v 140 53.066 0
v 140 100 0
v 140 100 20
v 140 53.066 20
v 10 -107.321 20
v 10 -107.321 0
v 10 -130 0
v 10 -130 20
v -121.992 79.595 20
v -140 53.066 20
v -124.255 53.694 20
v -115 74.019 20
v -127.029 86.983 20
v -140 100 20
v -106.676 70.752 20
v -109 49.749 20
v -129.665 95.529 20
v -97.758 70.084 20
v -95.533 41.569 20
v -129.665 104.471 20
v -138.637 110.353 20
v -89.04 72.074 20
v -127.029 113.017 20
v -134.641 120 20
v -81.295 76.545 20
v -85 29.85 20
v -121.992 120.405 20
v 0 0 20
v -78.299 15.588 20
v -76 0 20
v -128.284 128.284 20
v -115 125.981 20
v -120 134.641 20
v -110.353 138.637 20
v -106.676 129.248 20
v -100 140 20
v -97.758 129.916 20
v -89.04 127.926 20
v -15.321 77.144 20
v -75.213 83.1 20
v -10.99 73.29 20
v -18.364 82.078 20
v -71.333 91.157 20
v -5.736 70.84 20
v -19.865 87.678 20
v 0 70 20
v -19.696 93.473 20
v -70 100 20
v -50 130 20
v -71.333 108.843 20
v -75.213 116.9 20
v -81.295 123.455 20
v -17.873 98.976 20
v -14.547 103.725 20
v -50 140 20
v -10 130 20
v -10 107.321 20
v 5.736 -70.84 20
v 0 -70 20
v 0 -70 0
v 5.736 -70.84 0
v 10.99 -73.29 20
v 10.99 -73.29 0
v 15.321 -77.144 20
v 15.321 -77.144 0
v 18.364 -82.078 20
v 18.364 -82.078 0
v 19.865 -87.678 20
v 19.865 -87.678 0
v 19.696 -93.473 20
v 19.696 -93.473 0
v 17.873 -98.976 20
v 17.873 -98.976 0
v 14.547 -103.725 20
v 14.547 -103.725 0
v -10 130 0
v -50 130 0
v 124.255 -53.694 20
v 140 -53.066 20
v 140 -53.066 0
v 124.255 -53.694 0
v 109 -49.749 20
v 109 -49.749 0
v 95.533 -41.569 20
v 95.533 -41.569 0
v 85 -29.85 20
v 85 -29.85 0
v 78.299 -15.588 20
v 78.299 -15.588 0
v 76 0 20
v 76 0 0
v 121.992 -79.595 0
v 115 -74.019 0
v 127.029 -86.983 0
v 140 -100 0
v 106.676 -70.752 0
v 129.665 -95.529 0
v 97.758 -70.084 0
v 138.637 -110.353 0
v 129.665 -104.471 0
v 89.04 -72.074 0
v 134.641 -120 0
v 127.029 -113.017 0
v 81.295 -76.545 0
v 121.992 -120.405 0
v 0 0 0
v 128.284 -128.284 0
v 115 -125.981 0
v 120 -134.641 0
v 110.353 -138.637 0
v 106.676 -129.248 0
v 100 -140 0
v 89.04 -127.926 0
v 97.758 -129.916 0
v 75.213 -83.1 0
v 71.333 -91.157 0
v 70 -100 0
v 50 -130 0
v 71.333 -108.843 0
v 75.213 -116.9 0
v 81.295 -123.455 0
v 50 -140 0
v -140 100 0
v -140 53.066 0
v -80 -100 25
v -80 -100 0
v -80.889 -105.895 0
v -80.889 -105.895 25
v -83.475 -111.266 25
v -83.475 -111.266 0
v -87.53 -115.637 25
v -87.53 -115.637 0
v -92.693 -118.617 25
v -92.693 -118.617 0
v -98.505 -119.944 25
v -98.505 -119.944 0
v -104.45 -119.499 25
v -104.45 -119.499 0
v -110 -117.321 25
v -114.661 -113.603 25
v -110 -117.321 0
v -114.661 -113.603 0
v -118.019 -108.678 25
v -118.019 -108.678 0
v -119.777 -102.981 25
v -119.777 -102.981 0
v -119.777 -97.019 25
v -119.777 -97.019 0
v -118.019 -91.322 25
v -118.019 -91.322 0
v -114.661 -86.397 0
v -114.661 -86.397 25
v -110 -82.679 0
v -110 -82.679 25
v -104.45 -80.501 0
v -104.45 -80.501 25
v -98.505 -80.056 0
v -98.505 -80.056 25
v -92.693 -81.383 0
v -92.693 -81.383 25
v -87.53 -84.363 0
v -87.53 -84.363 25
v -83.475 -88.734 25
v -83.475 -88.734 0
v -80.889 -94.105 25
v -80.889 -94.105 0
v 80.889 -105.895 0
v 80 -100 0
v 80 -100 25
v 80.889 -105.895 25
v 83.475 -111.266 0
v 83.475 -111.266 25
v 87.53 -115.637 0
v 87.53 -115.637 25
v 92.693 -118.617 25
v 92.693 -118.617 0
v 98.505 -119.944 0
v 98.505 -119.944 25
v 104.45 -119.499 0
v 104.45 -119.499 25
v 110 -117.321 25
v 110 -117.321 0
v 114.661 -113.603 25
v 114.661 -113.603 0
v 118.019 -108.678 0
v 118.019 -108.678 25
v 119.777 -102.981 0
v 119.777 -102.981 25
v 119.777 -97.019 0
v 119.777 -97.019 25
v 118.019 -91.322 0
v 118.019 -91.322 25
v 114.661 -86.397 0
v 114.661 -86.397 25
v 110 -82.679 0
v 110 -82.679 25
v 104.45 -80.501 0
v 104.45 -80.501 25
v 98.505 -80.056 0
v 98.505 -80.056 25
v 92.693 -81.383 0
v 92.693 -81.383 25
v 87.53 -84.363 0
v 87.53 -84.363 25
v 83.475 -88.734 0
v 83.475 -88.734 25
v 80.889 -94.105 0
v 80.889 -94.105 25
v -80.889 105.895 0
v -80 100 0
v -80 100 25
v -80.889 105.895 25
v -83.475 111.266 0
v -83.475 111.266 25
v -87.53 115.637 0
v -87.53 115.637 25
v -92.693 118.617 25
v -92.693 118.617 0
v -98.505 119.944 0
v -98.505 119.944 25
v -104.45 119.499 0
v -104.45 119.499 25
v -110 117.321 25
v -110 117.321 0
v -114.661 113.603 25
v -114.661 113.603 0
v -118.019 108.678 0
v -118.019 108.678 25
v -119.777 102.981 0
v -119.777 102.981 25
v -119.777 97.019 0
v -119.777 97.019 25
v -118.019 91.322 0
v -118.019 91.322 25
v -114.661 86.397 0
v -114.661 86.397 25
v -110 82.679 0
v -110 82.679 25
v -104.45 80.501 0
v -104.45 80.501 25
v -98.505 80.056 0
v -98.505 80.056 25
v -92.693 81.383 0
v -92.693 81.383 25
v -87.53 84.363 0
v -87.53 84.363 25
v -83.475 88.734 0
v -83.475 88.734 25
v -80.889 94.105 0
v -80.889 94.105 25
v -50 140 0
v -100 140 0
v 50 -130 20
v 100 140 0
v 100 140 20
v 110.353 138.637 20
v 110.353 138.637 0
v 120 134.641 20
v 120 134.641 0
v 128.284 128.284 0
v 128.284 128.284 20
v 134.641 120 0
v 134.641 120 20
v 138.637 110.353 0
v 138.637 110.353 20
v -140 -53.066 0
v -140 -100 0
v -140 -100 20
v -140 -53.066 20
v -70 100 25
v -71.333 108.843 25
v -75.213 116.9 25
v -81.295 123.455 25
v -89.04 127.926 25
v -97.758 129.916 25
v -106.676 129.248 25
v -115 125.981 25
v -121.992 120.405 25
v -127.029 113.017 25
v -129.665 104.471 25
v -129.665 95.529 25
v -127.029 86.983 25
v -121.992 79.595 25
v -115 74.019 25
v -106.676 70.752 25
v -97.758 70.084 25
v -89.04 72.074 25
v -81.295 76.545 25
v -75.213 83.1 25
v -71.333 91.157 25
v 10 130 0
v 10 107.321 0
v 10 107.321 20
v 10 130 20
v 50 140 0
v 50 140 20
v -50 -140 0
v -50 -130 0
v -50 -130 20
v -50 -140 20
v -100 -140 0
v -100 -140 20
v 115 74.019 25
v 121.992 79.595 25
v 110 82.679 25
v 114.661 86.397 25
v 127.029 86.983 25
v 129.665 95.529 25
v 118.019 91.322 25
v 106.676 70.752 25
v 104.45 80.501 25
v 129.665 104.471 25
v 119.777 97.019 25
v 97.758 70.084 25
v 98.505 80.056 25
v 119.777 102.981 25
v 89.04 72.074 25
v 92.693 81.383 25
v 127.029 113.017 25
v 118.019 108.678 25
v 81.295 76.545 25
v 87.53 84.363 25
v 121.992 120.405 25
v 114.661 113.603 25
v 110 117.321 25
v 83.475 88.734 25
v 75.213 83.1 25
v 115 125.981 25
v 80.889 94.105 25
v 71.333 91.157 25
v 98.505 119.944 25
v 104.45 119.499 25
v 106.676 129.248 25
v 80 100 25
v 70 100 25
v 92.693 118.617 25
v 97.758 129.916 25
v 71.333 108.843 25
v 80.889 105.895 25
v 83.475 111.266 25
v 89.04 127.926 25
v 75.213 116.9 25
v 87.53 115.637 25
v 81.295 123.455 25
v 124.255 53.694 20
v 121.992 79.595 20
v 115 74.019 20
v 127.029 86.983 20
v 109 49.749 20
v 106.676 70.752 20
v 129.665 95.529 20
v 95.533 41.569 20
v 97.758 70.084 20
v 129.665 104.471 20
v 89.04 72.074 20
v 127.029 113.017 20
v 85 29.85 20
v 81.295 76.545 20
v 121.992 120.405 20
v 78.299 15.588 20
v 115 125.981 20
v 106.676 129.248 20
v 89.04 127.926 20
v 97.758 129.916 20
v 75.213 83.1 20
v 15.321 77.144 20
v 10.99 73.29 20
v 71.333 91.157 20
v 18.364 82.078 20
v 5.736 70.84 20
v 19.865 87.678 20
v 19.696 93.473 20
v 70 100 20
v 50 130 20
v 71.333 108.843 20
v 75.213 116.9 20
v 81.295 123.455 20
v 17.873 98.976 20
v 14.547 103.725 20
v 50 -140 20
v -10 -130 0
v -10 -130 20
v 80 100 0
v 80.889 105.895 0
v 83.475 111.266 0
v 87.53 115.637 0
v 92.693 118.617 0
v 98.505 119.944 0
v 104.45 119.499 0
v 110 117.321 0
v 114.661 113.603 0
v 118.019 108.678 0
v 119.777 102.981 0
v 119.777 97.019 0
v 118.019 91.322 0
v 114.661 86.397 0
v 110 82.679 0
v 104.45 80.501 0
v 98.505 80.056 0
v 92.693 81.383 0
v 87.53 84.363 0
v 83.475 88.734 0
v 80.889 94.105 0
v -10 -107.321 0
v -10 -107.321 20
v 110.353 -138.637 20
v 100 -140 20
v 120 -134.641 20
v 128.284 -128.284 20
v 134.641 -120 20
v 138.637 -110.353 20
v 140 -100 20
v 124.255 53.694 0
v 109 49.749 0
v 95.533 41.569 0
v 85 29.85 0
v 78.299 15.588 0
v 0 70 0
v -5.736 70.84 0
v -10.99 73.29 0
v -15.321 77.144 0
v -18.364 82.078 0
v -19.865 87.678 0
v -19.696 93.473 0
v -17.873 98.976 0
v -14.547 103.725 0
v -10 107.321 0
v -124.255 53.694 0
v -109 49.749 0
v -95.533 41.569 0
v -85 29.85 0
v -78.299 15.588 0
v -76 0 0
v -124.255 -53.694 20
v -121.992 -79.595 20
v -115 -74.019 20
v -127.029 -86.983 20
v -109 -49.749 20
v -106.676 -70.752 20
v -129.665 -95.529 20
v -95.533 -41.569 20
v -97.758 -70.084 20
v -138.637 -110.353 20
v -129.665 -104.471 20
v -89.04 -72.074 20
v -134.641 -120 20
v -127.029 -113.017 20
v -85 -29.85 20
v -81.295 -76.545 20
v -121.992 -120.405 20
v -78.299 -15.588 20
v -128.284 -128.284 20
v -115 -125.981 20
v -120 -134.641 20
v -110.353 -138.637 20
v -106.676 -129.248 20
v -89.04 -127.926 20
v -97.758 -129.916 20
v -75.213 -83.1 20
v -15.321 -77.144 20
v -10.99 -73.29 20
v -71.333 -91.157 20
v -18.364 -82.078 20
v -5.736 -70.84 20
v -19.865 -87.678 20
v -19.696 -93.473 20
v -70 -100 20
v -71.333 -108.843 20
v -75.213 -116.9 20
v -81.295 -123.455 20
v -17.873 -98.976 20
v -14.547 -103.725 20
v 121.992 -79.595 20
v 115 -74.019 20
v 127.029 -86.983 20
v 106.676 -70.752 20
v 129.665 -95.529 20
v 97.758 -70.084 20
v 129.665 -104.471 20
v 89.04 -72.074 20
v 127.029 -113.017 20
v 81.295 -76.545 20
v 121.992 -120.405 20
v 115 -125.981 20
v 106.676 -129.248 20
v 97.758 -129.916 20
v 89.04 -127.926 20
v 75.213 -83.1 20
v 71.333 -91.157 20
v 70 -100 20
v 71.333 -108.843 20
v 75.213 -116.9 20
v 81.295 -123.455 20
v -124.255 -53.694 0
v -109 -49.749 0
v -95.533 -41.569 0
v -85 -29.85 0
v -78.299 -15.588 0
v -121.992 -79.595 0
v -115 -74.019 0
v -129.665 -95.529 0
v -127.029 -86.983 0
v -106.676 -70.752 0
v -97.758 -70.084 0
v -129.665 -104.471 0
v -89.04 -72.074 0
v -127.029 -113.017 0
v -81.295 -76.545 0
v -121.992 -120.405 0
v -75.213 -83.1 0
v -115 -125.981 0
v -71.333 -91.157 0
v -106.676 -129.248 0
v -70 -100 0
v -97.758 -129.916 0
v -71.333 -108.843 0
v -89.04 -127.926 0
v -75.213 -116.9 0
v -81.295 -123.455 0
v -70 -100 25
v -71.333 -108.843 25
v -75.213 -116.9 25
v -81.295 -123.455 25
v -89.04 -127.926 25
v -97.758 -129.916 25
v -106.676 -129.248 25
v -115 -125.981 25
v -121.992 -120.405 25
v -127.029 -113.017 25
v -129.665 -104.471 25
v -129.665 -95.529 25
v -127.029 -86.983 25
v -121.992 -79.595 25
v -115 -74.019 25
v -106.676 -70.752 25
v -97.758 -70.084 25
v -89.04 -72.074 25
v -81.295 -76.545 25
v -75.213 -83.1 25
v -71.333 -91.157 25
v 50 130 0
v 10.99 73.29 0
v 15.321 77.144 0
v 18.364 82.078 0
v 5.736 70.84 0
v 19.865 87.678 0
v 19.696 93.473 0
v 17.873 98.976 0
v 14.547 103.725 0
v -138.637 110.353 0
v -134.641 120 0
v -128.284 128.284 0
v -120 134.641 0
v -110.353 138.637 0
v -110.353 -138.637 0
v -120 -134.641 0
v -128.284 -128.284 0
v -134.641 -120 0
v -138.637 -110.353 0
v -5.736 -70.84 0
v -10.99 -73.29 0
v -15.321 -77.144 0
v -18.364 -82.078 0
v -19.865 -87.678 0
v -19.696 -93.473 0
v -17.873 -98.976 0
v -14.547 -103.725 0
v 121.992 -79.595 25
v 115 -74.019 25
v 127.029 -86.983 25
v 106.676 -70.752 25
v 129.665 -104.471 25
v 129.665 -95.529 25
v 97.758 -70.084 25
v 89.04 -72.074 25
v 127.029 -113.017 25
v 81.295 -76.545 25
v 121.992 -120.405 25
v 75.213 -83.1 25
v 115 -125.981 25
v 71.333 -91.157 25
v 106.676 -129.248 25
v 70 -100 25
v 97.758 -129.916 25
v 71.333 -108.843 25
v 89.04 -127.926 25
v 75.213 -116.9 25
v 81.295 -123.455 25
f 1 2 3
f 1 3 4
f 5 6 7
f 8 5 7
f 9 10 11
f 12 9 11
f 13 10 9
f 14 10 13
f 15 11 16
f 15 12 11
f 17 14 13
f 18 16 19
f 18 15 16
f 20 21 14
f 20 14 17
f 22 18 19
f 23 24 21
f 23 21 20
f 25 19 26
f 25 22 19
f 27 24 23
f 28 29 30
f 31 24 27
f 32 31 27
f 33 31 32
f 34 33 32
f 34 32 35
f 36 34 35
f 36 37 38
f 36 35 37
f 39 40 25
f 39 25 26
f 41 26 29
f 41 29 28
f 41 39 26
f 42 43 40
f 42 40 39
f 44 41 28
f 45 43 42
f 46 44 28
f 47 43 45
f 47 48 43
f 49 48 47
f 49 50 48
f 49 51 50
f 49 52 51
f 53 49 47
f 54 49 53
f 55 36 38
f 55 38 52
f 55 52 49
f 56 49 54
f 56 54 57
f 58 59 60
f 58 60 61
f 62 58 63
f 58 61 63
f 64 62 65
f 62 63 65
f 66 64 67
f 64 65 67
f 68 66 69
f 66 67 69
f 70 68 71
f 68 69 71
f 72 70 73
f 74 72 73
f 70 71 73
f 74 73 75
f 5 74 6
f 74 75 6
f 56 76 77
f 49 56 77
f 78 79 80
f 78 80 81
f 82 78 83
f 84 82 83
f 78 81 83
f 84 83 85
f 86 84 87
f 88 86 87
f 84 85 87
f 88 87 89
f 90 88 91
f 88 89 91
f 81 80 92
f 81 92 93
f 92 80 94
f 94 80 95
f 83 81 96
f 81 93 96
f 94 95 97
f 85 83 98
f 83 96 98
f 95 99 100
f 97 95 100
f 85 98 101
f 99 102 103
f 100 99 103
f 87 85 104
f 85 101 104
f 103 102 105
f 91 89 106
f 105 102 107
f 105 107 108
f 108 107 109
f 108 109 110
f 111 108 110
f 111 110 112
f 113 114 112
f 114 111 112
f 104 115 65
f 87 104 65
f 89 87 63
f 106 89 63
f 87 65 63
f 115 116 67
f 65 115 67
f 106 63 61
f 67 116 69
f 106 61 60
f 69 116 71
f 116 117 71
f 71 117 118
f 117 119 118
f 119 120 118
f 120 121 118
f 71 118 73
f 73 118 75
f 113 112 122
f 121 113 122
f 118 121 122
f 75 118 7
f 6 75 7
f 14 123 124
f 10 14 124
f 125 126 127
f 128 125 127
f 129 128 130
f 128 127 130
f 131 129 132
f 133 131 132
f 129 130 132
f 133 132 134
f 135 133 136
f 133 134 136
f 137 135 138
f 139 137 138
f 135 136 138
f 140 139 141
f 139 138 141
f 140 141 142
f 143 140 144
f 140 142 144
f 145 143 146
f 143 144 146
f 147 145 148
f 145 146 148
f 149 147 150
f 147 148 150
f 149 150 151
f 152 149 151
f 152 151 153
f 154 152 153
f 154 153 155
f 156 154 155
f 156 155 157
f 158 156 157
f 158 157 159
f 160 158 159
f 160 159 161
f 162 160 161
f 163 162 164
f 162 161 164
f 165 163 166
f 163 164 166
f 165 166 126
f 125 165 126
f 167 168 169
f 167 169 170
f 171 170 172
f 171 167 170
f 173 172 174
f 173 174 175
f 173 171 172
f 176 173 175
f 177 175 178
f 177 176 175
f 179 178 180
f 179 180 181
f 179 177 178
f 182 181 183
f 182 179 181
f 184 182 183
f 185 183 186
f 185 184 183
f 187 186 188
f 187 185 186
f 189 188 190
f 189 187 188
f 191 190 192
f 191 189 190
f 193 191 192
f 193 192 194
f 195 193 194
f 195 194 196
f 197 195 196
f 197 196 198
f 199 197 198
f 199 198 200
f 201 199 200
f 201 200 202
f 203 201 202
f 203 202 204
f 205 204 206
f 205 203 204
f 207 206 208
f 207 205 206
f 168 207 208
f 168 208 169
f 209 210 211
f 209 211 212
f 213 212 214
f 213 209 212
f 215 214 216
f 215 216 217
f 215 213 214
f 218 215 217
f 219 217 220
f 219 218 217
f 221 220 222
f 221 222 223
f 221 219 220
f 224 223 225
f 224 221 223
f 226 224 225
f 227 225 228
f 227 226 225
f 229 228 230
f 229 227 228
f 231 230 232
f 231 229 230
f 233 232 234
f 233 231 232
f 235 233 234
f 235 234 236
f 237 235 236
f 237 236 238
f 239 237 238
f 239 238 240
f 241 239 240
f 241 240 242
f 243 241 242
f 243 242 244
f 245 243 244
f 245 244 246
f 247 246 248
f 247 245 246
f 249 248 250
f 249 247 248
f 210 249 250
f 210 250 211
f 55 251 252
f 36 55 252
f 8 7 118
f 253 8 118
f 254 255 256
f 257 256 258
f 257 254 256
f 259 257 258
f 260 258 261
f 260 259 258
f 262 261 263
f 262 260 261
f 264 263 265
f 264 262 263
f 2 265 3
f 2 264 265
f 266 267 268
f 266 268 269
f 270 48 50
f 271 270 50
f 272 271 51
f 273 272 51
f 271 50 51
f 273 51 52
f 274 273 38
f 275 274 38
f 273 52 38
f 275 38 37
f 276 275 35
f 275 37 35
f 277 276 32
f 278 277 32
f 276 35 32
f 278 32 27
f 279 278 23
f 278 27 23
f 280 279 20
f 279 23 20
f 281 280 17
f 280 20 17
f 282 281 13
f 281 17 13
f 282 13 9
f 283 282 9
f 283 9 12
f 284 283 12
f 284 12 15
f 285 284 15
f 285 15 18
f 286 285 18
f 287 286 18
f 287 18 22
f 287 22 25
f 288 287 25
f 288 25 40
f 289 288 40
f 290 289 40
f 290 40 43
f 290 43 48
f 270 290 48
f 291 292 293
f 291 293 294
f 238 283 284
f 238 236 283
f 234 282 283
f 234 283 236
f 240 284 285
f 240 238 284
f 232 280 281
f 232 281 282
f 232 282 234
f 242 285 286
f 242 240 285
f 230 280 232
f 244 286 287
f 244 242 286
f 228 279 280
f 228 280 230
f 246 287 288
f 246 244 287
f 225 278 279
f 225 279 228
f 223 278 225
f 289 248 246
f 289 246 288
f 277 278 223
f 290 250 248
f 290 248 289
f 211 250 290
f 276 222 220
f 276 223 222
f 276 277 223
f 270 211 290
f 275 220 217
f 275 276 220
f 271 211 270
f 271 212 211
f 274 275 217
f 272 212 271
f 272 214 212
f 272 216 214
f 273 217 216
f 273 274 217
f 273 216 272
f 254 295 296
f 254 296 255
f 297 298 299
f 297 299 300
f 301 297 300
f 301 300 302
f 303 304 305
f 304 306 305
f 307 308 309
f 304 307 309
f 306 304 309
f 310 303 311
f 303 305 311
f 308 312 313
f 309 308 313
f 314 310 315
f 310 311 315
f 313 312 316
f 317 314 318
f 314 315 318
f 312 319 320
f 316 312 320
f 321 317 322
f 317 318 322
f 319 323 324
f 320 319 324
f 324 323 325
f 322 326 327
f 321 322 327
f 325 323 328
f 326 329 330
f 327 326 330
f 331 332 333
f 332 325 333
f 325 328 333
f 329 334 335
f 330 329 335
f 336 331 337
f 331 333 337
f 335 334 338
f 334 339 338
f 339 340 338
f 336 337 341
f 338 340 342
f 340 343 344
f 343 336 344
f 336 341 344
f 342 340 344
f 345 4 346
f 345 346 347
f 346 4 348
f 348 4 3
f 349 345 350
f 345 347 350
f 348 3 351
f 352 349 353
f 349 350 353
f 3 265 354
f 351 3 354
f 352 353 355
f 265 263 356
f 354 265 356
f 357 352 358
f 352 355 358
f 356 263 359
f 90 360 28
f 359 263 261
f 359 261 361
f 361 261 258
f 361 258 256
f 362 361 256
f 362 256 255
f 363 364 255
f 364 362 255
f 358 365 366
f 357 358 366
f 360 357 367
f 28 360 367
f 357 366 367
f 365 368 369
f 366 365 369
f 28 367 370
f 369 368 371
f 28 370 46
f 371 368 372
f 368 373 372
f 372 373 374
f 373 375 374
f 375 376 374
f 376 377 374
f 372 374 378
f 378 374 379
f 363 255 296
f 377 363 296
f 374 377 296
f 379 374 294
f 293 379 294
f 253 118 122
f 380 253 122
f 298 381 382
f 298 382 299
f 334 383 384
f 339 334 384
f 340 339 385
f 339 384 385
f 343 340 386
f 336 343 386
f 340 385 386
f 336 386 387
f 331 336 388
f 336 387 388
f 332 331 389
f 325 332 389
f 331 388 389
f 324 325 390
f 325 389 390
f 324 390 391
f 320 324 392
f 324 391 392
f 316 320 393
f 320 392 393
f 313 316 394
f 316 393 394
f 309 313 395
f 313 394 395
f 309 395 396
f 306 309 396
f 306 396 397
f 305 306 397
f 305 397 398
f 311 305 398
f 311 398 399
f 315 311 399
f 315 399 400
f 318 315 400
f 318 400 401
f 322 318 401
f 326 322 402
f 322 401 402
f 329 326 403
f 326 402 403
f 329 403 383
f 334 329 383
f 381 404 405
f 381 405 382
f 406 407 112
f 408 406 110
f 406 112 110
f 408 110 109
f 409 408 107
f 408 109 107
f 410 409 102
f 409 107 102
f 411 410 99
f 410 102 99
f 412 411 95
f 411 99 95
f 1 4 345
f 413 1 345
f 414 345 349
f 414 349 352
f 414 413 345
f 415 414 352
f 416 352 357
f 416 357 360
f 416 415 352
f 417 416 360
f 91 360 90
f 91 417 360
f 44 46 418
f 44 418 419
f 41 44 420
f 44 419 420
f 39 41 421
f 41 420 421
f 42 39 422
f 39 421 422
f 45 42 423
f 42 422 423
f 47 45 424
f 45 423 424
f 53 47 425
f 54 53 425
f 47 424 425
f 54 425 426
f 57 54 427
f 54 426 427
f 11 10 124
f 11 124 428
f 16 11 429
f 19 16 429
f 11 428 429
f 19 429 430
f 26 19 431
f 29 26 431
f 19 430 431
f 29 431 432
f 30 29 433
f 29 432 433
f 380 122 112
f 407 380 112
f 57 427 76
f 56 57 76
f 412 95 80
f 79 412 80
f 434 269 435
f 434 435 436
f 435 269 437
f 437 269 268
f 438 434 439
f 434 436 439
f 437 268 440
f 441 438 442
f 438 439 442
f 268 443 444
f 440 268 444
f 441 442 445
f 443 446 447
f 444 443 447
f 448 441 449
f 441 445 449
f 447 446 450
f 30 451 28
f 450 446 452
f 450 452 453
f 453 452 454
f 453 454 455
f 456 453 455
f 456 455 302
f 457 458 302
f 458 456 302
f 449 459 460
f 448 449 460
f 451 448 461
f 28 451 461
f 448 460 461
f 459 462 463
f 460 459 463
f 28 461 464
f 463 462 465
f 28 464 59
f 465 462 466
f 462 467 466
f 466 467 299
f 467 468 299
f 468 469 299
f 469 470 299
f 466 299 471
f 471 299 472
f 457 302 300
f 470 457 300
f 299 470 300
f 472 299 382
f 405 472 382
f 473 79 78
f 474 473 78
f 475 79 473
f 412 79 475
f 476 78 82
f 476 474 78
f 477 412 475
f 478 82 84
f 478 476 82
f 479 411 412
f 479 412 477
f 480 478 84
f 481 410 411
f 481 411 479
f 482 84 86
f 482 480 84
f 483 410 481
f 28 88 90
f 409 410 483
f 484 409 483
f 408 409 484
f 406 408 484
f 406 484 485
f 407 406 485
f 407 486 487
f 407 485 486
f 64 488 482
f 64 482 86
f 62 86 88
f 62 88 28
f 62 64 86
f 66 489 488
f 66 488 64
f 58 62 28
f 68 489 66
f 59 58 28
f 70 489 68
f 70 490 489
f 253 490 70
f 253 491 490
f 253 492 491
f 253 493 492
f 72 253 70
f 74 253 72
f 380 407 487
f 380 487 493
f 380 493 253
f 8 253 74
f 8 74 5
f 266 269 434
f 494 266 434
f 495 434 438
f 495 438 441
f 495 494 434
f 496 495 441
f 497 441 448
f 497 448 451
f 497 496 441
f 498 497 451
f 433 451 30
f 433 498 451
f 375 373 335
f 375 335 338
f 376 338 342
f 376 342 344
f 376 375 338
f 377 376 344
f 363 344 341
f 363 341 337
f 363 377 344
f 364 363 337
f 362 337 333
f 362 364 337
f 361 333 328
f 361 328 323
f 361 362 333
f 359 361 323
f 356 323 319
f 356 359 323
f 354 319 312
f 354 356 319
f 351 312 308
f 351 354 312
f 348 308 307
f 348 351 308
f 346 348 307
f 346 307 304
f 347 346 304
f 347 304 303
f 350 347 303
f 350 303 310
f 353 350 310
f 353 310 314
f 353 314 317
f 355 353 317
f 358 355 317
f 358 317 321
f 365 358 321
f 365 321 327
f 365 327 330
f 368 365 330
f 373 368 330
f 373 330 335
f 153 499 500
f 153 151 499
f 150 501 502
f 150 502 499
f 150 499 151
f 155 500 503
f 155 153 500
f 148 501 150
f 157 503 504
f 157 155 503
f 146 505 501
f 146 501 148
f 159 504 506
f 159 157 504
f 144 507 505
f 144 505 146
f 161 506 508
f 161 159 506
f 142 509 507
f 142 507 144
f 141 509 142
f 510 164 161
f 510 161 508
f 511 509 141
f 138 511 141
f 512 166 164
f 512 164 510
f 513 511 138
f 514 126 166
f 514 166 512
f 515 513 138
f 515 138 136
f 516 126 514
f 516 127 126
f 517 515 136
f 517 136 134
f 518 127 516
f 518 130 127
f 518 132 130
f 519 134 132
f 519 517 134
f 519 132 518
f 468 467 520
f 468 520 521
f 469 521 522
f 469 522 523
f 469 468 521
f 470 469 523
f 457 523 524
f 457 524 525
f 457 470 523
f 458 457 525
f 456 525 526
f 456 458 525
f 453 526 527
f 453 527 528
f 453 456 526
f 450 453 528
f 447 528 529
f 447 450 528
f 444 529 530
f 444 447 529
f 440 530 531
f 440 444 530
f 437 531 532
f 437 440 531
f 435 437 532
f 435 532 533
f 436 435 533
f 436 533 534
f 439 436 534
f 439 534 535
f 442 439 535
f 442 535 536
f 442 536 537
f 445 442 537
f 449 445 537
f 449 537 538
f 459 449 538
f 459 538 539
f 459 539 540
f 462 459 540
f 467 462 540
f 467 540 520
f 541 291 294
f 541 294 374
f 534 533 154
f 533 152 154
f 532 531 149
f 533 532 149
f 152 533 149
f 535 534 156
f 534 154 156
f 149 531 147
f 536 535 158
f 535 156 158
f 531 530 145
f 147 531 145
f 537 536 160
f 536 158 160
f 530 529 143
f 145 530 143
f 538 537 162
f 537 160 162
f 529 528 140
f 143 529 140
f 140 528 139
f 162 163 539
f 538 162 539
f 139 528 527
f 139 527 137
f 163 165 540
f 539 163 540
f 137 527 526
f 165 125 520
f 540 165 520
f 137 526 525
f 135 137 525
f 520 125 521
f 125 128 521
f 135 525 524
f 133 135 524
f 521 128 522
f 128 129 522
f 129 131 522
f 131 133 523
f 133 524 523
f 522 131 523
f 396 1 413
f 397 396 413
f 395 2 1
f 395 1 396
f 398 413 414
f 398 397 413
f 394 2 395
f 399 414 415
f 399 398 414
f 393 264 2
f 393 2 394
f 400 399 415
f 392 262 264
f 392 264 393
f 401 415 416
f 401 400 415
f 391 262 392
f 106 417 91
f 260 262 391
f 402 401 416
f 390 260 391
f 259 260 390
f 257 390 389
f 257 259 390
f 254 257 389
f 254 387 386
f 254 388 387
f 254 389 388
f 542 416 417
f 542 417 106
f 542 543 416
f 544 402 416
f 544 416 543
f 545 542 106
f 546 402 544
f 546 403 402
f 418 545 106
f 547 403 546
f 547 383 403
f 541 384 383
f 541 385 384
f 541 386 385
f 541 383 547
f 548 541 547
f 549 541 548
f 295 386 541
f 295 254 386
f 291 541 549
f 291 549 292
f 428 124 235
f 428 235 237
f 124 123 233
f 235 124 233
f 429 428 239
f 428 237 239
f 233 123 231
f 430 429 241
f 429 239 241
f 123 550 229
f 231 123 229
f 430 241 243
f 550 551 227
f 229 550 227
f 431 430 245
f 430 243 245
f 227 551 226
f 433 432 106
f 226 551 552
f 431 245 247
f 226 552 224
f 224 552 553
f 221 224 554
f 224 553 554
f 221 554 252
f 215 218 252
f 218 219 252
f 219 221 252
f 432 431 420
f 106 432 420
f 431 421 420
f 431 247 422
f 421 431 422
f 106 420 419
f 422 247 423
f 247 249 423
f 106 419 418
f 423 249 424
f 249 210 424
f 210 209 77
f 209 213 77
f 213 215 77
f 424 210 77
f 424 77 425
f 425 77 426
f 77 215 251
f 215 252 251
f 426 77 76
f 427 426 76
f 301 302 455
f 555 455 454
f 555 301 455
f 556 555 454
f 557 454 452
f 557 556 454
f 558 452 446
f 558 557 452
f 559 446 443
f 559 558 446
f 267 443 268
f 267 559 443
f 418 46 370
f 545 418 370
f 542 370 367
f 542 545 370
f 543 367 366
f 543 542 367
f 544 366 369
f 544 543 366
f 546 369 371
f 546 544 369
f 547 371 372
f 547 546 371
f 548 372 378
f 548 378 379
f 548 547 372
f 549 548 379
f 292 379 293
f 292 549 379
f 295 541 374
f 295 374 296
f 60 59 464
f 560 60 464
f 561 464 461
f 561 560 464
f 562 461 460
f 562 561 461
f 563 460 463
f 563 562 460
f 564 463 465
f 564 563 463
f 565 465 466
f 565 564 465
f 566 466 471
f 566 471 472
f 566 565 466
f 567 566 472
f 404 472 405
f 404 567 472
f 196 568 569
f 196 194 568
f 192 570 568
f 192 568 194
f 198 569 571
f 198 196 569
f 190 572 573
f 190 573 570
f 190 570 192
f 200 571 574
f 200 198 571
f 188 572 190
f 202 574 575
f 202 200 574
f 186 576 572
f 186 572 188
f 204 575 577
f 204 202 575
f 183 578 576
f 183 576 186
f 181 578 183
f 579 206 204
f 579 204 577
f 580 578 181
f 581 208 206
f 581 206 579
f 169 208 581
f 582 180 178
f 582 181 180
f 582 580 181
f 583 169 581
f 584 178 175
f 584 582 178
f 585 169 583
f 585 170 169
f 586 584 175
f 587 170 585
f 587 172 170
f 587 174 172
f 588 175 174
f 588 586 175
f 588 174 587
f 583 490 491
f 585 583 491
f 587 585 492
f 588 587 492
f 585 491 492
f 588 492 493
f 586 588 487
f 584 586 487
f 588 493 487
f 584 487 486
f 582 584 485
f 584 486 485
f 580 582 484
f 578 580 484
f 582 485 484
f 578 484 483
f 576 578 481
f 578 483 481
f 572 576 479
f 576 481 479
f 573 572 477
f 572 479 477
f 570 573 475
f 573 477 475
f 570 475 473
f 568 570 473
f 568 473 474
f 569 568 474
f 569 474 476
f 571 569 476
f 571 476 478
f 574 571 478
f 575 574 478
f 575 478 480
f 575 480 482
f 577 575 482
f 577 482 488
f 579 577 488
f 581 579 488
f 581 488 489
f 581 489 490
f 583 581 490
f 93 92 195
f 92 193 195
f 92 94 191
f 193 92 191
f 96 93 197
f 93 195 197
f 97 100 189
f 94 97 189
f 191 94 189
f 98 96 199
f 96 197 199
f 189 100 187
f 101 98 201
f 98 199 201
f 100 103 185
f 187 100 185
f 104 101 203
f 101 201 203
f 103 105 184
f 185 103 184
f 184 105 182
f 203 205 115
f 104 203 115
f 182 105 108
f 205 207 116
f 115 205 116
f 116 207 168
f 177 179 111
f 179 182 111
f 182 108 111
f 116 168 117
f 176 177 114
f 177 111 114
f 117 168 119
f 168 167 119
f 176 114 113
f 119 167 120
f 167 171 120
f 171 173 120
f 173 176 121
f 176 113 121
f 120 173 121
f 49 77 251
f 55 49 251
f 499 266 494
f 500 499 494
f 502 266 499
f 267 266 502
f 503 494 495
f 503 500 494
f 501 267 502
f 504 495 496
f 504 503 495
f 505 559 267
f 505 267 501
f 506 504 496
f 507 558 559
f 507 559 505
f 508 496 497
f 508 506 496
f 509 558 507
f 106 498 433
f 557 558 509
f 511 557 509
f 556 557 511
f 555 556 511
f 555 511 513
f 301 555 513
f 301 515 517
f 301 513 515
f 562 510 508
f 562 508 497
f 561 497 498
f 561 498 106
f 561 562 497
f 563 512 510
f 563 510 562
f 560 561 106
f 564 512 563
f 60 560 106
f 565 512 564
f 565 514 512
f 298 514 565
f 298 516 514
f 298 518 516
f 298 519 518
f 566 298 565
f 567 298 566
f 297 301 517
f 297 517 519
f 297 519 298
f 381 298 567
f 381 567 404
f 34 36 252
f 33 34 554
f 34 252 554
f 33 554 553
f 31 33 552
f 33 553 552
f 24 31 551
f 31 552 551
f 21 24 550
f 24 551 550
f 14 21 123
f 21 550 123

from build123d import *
from build123d.topology import SkipClean

# Parameters (mm, degrees)
SKETCH1_R                                    = 30
BOSS_EXTRUDE3_DEPTH                          = 20
SKETCH1_3_R                                  = 30
SKETCH1_3_R_2                                = 20
BOSS_EXTRUDE4_DEPTH                          = 25
MIRROR1_AT_THE_SECOND_PLANE_COPY_1_SKETC_R   = 30
MIRROR1_AT_THE_SECOND_PLANE_COPY_1_DEPTH     = 20
MIRROR1_AT_THE_SECOND_PLANE_COPY_2_SKETC_R   = 30
MIRROR1_AT_THE_SECOND_PLANE_COPY_2_SKETC_R_2 = 20
MIRROR1_AT_THE_SECOND_PLANE_COPY_2_DEPTH     = 25


with BuildPart() as part:
    # Sketch1 → Boss-Extrude3 (new body)
    with BuildSketch(Plane.XY):
        with BuildLine():
            Line((-140, 100), (-140, 53.065996646))
            ThreePointArc((-140, 53.065996646), (-95.532624121, 41.569219382), (-76, 0))
            Line((-76, 0), (0, 0))
            Line((0, 0), (0, 70))
            ThreePointArc((0, 70), (-19.318516526, 84.823619098), (-10, 107.320508076))
            Line((-10, 107.320508076), (-10, 130))
            Line((-10, 130), (-50, 130))
            Line((-50, 130), (-50, 140))
            Line((-50, 140), (-100, 140))
            ThreePointArc((-100, 140), (-128.284271247, 128.284271247), (-140, 100))
        make_face()
        with Locations((-100, 100)):
            Circle(SKETCH1_R, mode=Mode.SUBTRACT)
    boss_extrude3 = extrude(amount=BOSS_EXTRUDE3_DEPTH)

    # Sketch1<3> → Boss-Extrude4 (add)
    with BuildSketch(Plane.XY):
        with Locations((-100, 100)):
            Circle(SKETCH1_3_R)
        with Locations((-100, 100)):
            Circle(SKETCH1_3_R_2, mode=Mode.SUBTRACT)
    boss_extrude4 = extrude(amount=BOSS_EXTRUDE4_DEPTH)

    # Mirror1: Boss-Extrude3, Boss-Extrude4 across plane
    add(boss_extrude3.mirror(Plane(origin=(0, 0, 0), x_dir=(0, 0, 1), z_dir=(1, 0, 0))))
    add(boss_extrude4.mirror(Plane(origin=(0, 0, 0), x_dir=(0, 0, 1), z_dir=(1, 0, 0))))

    # Mirror1 at the second plane: Boss-Extrude3, Boss-Extrude4 across plane
    with SkipClean():  # the faces are left unmerged after this step: merging them gives an invalid solid
        add(boss_extrude3.mirror(Plane.ZX))
        add(boss_extrude4.mirror(Plane.ZX))

    # Mirror1 at the second plane copy 1 sketc → Mirror1 at the second plane copy 1 (add)
    with SkipClean():  # the faces are left unmerged after this step: merging them gives an invalid solid
        with BuildSketch(Plane(origin=(0, 0, 0), x_dir=(-1, 0, 0), z_dir=(0, 0, 1))):
            with BuildLine():
                Line((-140, 100), (-140, 53.065996646))
                ThreePointArc((-140, 53.065996646), (-95.532624121, 41.569219382), (-76, 0))
                Line((-76, 0), (0, 0))
                Line((0, 0), (0, 70))
                ThreePointArc((0, 70), (-19.318516526, 84.823619098), (-10, 107.320508076))
                Line((-10, 107.320508076), (-10, 130))
                Line((-10, 130), (-50, 130))
                Line((-50, 130), (-50, 140))
                Line((-50, 140), (-100, 140))
                ThreePointArc((-100, 140), (-128.284271247, 128.284271247), (-140, 100))
            make_face()
            with Locations((-100, 100)):
                Circle(MIRROR1_AT_THE_SECOND_PLANE_COPY_1_SKETC_R, mode=Mode.SUBTRACT)
        extrude(amount=MIRROR1_AT_THE_SECOND_PLANE_COPY_1_DEPTH)

    # Mirror1 at the second plane copy 2 sketc → Mirror1 at the second plane copy 2 (add)
    with SkipClean():  # the faces are left unmerged after this step: merging them gives an invalid solid
        with BuildSketch(Plane(origin=(0, 0, 0), x_dir=(-1, 0, 0), z_dir=(0, 0, 1))):
            with Locations((-100, 100)):
                Circle(MIRROR1_AT_THE_SECOND_PLANE_COPY_2_SKETC_R)
            with Locations((-100, 100)):
                Circle(MIRROR1_AT_THE_SECOND_PLANE_COPY_2_SKETC_R_2, mode=Mode.SUBTRACT)
        extrude(amount=MIRROR1_AT_THE_SECOND_PLANE_COPY_2_DEPTH)


solid = part.part
